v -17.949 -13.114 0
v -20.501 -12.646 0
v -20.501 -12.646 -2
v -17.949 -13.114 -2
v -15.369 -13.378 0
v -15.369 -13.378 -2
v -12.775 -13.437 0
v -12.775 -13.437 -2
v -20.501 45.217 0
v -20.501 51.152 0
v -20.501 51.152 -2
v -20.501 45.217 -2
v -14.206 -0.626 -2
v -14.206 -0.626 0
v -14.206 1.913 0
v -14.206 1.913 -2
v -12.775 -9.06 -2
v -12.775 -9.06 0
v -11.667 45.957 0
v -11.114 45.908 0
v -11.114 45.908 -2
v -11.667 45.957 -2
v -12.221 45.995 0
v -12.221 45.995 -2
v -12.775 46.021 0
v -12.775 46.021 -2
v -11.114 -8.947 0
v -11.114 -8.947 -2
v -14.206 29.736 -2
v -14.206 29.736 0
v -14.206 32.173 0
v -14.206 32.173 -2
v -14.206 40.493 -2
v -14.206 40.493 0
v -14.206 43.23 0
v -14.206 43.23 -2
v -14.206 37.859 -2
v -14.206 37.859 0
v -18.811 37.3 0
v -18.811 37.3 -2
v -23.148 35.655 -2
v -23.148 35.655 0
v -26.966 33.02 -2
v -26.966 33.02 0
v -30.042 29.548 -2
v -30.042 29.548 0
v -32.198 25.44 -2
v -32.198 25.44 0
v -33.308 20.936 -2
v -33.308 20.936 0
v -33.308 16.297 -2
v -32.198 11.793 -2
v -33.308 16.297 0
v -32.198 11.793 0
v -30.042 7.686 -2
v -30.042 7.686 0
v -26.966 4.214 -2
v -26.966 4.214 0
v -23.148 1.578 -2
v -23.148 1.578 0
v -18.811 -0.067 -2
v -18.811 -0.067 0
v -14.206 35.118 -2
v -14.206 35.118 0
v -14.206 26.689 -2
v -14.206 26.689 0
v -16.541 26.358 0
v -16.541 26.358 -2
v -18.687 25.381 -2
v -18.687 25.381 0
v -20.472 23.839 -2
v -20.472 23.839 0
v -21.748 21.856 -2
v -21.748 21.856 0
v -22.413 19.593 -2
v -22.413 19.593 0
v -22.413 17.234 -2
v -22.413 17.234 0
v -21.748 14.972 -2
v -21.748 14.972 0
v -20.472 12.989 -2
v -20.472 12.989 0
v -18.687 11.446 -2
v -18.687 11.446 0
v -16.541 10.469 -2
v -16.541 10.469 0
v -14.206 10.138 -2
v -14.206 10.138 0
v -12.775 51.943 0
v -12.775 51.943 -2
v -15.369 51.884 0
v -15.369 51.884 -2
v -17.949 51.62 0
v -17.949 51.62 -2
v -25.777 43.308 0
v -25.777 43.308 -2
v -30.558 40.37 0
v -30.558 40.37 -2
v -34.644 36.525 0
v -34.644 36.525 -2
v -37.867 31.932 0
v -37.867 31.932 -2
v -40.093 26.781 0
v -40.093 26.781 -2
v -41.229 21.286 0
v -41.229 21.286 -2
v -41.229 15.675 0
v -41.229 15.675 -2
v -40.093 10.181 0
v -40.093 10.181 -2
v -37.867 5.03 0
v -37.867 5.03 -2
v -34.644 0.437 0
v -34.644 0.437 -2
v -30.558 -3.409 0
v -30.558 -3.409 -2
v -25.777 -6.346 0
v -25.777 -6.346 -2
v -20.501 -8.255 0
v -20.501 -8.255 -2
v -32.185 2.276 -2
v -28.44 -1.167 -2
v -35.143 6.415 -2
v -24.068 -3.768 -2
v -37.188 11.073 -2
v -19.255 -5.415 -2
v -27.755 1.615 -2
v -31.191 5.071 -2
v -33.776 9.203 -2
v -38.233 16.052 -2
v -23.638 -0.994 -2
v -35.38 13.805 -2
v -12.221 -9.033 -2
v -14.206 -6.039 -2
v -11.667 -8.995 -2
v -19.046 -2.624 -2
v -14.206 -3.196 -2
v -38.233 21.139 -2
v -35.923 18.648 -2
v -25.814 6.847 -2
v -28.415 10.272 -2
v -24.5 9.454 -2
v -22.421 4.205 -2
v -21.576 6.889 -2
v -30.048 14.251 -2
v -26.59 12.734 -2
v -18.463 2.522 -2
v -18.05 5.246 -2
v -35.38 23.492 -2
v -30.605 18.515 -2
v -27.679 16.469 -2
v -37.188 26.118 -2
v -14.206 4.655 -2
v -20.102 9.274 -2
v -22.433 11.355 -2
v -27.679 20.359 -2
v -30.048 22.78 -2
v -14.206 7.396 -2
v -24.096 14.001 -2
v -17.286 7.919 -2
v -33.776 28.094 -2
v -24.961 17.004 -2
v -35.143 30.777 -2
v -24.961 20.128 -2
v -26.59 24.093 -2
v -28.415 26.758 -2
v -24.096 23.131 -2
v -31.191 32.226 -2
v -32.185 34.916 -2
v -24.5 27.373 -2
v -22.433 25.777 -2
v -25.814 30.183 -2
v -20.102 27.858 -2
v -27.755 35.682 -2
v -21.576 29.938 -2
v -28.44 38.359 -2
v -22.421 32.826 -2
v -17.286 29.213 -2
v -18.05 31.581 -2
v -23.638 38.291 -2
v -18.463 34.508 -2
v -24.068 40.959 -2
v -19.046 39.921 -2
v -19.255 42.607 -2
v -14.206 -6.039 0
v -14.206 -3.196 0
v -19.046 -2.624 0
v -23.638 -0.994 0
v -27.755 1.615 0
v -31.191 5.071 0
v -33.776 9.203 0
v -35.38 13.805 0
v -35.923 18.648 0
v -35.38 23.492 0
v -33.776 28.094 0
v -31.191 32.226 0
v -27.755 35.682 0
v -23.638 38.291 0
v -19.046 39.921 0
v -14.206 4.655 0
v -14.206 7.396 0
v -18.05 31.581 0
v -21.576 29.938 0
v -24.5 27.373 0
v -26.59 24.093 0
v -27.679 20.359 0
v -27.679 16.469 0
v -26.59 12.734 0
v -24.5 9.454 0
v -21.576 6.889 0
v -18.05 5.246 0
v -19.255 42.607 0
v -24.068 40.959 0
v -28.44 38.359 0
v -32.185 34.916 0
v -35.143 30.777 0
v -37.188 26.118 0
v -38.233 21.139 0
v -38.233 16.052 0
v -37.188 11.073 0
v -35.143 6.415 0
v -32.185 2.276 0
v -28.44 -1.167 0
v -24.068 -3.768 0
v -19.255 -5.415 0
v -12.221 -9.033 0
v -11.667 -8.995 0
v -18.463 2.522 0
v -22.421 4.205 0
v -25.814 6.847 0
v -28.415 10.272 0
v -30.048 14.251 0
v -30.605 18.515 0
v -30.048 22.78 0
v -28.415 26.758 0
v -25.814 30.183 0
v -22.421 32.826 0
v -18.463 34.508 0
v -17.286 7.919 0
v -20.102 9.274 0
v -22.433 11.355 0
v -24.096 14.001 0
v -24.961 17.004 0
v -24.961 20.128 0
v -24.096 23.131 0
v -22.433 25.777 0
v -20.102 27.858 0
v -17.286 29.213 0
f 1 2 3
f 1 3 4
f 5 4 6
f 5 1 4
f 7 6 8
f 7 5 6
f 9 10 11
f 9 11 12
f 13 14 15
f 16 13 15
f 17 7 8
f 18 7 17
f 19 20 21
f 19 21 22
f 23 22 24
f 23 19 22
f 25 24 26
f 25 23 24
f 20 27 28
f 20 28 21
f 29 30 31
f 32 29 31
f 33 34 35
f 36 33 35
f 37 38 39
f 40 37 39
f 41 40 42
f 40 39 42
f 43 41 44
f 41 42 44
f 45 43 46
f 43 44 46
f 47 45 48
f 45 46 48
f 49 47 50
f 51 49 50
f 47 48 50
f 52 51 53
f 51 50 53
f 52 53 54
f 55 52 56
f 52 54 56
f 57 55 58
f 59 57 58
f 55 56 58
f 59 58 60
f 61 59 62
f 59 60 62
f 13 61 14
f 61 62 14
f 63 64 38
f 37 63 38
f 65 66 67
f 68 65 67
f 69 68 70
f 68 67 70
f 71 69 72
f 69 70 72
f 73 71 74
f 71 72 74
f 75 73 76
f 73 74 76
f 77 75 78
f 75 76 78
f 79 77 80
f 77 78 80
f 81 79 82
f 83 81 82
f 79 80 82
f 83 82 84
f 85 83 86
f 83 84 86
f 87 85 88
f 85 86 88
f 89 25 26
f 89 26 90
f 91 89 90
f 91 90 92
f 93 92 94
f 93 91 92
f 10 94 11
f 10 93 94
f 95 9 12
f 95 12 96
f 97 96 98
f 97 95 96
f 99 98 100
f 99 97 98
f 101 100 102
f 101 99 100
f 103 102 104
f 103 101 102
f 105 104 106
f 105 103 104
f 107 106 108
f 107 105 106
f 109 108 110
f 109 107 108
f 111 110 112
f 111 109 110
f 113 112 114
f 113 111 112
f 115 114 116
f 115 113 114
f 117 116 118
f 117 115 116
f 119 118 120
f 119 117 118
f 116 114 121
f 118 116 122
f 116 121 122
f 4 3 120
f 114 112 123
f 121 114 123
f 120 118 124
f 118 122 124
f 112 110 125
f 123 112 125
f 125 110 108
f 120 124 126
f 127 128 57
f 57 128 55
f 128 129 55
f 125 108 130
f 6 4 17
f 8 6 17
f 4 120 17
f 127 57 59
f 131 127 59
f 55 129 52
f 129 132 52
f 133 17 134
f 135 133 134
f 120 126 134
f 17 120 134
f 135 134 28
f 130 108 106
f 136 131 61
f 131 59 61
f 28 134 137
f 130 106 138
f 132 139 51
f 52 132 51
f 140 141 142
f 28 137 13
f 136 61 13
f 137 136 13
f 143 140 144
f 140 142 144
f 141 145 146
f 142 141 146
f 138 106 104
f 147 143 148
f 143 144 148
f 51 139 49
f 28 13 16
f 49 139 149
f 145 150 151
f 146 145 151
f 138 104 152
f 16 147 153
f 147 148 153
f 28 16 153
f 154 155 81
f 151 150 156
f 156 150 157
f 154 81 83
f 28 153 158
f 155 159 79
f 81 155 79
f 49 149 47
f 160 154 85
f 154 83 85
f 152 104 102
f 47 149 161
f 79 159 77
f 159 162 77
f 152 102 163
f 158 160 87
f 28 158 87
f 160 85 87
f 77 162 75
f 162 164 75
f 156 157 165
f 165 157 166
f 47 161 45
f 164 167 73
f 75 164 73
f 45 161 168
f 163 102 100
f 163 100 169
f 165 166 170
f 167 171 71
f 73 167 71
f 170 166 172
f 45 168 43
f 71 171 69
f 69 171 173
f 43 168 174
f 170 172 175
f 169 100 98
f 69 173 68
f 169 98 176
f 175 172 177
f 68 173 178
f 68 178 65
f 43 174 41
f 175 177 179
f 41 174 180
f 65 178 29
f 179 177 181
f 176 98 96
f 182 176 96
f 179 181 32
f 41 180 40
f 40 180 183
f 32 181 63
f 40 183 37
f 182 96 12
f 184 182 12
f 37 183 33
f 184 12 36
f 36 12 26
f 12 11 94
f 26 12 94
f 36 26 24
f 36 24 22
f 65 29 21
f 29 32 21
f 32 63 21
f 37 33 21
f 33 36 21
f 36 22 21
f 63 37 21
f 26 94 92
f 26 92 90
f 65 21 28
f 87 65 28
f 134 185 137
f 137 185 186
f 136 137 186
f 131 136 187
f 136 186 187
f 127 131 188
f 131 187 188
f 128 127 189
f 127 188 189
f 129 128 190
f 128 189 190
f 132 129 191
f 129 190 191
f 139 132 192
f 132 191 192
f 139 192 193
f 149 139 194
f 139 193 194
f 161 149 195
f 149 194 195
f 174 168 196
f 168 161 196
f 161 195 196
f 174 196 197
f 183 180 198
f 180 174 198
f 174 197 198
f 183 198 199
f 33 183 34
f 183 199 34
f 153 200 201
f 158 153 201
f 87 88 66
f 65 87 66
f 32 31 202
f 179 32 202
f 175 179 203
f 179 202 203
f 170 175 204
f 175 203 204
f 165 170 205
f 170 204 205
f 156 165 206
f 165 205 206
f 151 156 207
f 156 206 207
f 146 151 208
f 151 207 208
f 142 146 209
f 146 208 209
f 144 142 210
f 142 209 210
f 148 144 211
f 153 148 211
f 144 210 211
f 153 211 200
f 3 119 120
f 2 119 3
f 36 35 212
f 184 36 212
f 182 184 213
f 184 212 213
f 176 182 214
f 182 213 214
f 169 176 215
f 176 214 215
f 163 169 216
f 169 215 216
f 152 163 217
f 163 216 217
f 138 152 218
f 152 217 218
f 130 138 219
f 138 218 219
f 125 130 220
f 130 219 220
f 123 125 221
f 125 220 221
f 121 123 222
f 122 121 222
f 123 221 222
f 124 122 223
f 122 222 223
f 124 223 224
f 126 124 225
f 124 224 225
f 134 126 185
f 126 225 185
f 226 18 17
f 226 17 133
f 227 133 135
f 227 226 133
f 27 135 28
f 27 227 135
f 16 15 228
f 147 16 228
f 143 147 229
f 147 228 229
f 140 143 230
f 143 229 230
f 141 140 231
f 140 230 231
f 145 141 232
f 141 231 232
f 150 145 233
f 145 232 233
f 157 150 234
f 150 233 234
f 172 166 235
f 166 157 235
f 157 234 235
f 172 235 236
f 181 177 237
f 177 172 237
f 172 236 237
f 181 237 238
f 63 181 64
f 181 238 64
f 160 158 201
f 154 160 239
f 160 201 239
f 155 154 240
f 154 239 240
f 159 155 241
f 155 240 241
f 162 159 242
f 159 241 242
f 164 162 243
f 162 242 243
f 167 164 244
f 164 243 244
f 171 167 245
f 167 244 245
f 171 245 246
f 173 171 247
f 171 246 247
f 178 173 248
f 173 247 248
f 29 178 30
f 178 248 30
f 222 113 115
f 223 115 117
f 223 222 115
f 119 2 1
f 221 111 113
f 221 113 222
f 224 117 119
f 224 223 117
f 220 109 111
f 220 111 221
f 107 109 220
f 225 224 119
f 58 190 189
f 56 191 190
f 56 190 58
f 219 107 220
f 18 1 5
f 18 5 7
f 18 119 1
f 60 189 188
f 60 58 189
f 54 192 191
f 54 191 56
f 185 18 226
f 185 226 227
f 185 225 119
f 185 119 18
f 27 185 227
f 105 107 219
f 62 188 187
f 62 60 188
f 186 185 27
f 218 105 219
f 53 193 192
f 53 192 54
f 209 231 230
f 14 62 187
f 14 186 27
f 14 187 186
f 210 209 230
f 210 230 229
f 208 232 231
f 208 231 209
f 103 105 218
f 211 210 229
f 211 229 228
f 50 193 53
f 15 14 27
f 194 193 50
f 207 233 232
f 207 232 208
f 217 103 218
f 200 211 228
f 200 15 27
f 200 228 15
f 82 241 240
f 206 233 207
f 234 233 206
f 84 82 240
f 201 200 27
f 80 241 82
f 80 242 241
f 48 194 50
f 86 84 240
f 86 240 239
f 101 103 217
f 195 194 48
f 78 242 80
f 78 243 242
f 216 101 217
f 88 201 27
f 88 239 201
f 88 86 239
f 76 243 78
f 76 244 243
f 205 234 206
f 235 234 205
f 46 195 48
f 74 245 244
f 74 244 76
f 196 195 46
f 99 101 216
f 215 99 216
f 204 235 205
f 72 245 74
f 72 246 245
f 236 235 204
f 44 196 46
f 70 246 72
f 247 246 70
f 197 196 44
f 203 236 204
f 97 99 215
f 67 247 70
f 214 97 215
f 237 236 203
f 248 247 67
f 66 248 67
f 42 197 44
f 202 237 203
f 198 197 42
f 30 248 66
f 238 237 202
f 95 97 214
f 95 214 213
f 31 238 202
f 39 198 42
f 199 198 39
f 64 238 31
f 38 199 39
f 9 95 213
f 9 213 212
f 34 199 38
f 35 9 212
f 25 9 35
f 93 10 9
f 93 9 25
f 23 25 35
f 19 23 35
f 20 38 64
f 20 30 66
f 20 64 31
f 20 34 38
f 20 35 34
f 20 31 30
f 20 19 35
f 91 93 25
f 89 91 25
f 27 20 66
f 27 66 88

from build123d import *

# Parameters (mm, degrees)
F1_DEPTH = 2
F3_DEPTH = 4


with BuildPart() as f1:
    # F0 (on Top) → F1 (new body)
    with BuildSketch(Plane.XY):
        with BuildLine():
            Line((-11.113913, -8.946678), (-11.113913, 45.908373))
            ThreePointArc((-11.113913, 45.908373), (-11.943595, 45.97737), (-12.774983, 46.021273))
            Line((-12.774983, 46.021273), (-12.774983, 51.942695))
            ThreePointArc((-12.774983, 51.942695), (-16.661516, 51.777692), (-20.500943, 51.152251))
            Line((-20.500943, 51.152251), (-20.500943, 45.216891))
            ThreePointArc((-20.500943, 45.216891), (-41.372447, 18.480848), (-20.500943, -8.255196))
            Line((-20.500943, -8.255196), (-20.500943, -12.646276))
            ThreePointArc((-20.500943, -12.646276), (-16.661516, -13.271717), (-12.774983, -13.436719))
            Line((-12.774983, -13.436719), (-12.774983, -9.059578))
            ThreePointArc((-12.774983, -9.059578), (-11.943595, -9.015674), (-11.113913, -8.946678))
        make_face()
    extrude(amount=-F1_DEPTH)

    # F2 (on Top) → F3 (cut)
    with BuildSketch(Plane.XY):
        with BuildLine():
            Line((-14.205587, 10.137872), (-14.205587, 26.689431))
            ThreePointArc((-14.205587, 26.689431), (-22.497851, 18.413651), (-14.205587, 10.137872))
        make_face()
        with BuildLine():
            Line((-14.205587, 29.735729), (-14.205587, 32.172769))
            ThreePointArc((-14.205587, 32.172769), (-27.81698, 18.413651), (-14.205587, 4.654533))
            Line((-14.205587, 4.654533), (-14.205587, 7.396203))
            ThreePointArc((-14.205587, 7.396203), (-25.070721, 18.565966), (-14.205587, 29.735729))
        make_face()
        with BuildLine():
            ThreePointArc((-14.205587, 1.912864), (-30.605126, 18.515195), (-14.205587, 35.117526))
            Line((-14.205587, 35.117526), (-14.205587, 37.859194))
            ThreePointArc((-14.205587, 37.859194), (-33.448043, 18.616738), (-14.205587, -0.625718))
            Line((-14.205587, -0.625718), (-14.205587, 1.912864))
        make_face()
        with BuildLine():
            ThreePointArc((-14.205587, -3.196367), (-35.923159, 18.64843), (-14.205587, 40.493228))
            Line((-14.205587, 40.493228), (-14.205587, 43.230407))
            ThreePointArc((-14.205587, 43.230407), (-38.364807, 18.595791), (-14.205587, -6.038824))
            Line((-14.205587, -6.038824), (-14.205587, -3.196367))
        make_face()
    extrude(amount=-F3_DEPTH, mode=Mode.SUBTRACT)


solid = f1.part
